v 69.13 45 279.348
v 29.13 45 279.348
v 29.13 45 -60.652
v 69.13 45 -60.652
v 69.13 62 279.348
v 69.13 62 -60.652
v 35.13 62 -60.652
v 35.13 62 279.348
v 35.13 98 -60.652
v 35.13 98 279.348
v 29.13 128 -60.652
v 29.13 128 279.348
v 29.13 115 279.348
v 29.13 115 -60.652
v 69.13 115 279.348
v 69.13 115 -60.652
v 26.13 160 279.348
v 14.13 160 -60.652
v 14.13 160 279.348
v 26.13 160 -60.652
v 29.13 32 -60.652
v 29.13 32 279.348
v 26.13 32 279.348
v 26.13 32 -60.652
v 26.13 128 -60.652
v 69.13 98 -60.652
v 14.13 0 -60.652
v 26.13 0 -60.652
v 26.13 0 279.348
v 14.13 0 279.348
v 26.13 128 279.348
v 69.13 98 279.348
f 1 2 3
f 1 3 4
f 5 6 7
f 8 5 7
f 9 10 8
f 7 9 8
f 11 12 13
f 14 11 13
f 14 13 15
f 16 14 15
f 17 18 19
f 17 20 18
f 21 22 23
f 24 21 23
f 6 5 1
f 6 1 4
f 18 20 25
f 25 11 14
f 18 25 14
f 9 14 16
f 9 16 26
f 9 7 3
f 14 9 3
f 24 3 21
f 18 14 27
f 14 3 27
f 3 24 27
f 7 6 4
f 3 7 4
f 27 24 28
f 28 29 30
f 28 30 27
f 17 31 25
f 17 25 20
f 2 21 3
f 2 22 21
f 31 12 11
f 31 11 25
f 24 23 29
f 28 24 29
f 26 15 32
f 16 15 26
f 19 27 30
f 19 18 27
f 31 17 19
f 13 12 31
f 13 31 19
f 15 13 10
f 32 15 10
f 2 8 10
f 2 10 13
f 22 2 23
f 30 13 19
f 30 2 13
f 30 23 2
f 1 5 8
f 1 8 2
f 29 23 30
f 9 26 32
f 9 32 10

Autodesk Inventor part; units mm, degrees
ref_plane "YZ Plane" through (0, 0, 0) normal (1, 0, 0) x (0, 1, 0)
ref_plane "XZ Plane" through (0, 0, 0) normal (0, 1, 0) x (-1, 0, 0)
ref_plane "XY Plane" through (0, 0, 0) normal (0, 0, 1) x (1, 0, 0)
sketch "Sketch1" plane through (0, 0, 0) normal (0, 1, 0) x (-1, 0, 0)
  line L0 (0, 279.3478) -> (-39.1304, 279.3478)
  line L1 (-39.1304, 279.3478) -> (-39.1304, -195.6522)
  line L2 (-39.1304, -195.6522) -> (0, -195.6522)
  line L3 (0, -195.6522) -> (0, 279.3478)
  line L4 (-39.1304, 279.3478) -> (-29.1304, 279.3478)
  line L5 (-29.1304, 254.3478) -> (-39.1304, 254.3478)
  line L6 (-39.1304, 254.3478) -> (-39.1304, 279.3478)
  line L7 (-39.1304, -195.6522) -> (-29.1304, -195.6522)
  line L8 (-29.1304, -170.6522) -> (-39.1304, -170.6522)
  line L9 (-39.1304, -170.6522) -> (-39.1304, -195.6522)
  point P0 (0, 0)
  point P1 (-39.1304, 254.3478)
  dimension "d0" = 475
  dimension "d4" = 25
  dimension "d5" = 25
extrude "Extrusion1" add sketch "Sketch1" along normal blind 160
sketch "Sketch2" plane through (0, 0, 279.3478) normal (0, 0, 1) x (1, 0, 0)
  line L0 (0, 160) -> (39.1304, 160) projected
  line L1 (0, 160) -> (39.1304, 160)
  line L2 (39.1304, 160) -> (39.1304, 0)
  line L3 (39.1304, 0) -> (0, 0)
  line L4 (0, 0) -> (0, 160)
  line L5 (39.1304, 160) -> (29.1304, 160)
  line L6 (29.1304, 160) -> (29.1304, 115)
  line L7 (29.1304, 115) -> (39.1304, 115)
  line L8 (39.1304, 115) -> (39.1304, 160)
  line L9 (39.1304, 0) -> (29.1304, 0)
  line L10 (29.1304, 0) -> (29.1304, 45)
  line L11 (29.1304, 45) -> (39.1304, 45)
  line L12 (39.1304, 45) -> (39.1304, 0)
  circle A0 centre (39.1304, 80) radius 18
  line L13 (35.1304, 75) -> (39.1304, 75)
  line L14 (39.1304, 75) -> (39.1304, 98)
  line L15 (39.1304, 98) -> (35.1304, 98)
  line L16 (35.1304, 98) -> (35.1304, 75)
  line L17 (35.1304, 75) -> (39.1304, 75)
  line L18 (39.1304, 75) -> (39.1304, 62)
  line L19 (39.1304, 62) -> (35.1304, 62)
  line L20 (35.1304, 62) -> (35.1304, 75)
  line L21 (39.1304, 0) -> (39.1304, 160) projected
  line L22 (0, 160) -> (19.1304, 160)
  line L23 (19.1304, 160) -> (19.1304, 0)
  line L24 (19.1304, 0) -> (0, 0)
  line L25 (0, 0) -> (0, 160)
  point P0 (0, 0)
  point P1 (34.1304, 115)
  point P2 (34.1304, 160)
  point P3 (39.1304, 45)
  point P4 (39.1304, 115)
  dimension "d6" = 10
  dimension "d7" = 45
  dimension "d8" = 45
  dimension "d9" = 4
  dimension "d10" = 36
  dimension "d11" = 80
  dimension "d12" = 80
  dimension "d15" = 20
extrude "Extrusion2" cut sketch "Sketch2" against normal up to surface (475 mm away) contours L0 L23 L3 L4 | L0 L2 L7 L6 | L10 L11 L2 L3 | L2 L13 L16 A0 | A0 L16 L15 | L2 A0 L20 L13 | L19 L20 A0
sketch "Sketch3" plane through (0, 160, 0) normal (0, 1, 0) x (1, 0, 0)
  line L0 (-18, 219) -> (160, 219)
  line L1 (160, 219) -> (160, 60.6522)
  line L2 (160, 60.6522) -> (-18, 60.6522)
  line L3 (-18, 60.6522) -> (-18, 219)
  line L4 (19.1304, -279.3478) -> (29.1304, -279.3478) projected
  point P0 (0, 0)
  dimension "d16" = 340
extrude "Extrusion3" cut sketch "Sketch3" against normal blind 200
sketch "Sketch4" plane through (39.1304, 98, 279.3478) normal (1, 0, 0) x (0, 0, -1)
  line L0 (340, 0) -> (340, 17) projected
  line L1 (340, 17) -> (0, 17) projected
  line L2 (0, 0) -> (0, 17) projected
  line L3 (0, 0) -> (340, 0) projected
  line L4 (340, -53) -> (340, -36) projected
  line L5 (340, -36) -> (0, -36) projected
  line L6 (0, -53) -> (0, -36) projected
  line L7 (0, -53) -> (340, -53) projected
  point P0 (279.3478, -98)
extrude "Extrusion4" add sketch "Sketch4" along normal blind 30
sketch "Sketch5" plane through (19.1304, 0, 279.3478) normal (-1, 0, 0) x (0, 0, 1)
  line L0 (-340, 160) -> (-340, 0) projected
  line L1 (0, 0) -> (-340, 0) projected
  line L2 (0, 160) -> (0, 0) projected
  line L3 (-340, 160) -> (0, 160) projected
  point P0 (-279.3478, 0)
extrude "Extrusion5" add sketch "Sketch5" along normal blind 5
sketch "Sketch6" plane through (29.1304, 115, 279.3478) normal (0, 0, 1) x (1, 0, 0)
  line L0 (9, 13) -> (-3, 13)
  line L1 (-3, 13) -> (-3, 45)
  line L2 (-3, 45) -> (9, 45)
  line L3 (9, 45) -> (9, 13)
  line L4 (-15, -115) -> (0, -115) projected
  line L5 (11, -83) -> (-3, -83)
  line L6 (-3, -83) -> (-3, -115)
  line L7 (-3, -115) -> (11, -115)
  line L8 (11, -115) -> (11, -83)
  line L9 (0, -70) -> (40, -70) projected
  line L10 (0, 0) -> (40, 0) projected
  line L11 (0, 0) -> (0, 45) projected
  point P0 (-29.1304, -115)
  point P1 (0, -115)
  dimension "d23" = 13
  dimension "d24" = 13
  dimension "d25" = 3
extrude "Extrusion6" cut sketch "Sketch6" against normal blind 500
sketch "Sketch7" plane through (35.1304, 62, 279.3478) normal (0, 0, 1) x (1, 0, 0)
  line L0 (55, 54) -> (-8, 54)
  line L1 (-8, 54) -> (-8, -18)
  line L2 (-8, -18) -> (55, -18)
  line L3 (55, -18) -> (55, 54)
  line L4 (-6, 53) -> (34, 53) projected
  line L5 (-6, -17) -> (34, -17) projected
  line L6 (-6, -30) -> (-6, -17) projected
  point P0 (-35.1304, -62)
  dimension "d28" = 1
  dimension "d29" = 1
  dimension "d30" = 2
properties part number "MainRails" material "Aluminum 6061"
